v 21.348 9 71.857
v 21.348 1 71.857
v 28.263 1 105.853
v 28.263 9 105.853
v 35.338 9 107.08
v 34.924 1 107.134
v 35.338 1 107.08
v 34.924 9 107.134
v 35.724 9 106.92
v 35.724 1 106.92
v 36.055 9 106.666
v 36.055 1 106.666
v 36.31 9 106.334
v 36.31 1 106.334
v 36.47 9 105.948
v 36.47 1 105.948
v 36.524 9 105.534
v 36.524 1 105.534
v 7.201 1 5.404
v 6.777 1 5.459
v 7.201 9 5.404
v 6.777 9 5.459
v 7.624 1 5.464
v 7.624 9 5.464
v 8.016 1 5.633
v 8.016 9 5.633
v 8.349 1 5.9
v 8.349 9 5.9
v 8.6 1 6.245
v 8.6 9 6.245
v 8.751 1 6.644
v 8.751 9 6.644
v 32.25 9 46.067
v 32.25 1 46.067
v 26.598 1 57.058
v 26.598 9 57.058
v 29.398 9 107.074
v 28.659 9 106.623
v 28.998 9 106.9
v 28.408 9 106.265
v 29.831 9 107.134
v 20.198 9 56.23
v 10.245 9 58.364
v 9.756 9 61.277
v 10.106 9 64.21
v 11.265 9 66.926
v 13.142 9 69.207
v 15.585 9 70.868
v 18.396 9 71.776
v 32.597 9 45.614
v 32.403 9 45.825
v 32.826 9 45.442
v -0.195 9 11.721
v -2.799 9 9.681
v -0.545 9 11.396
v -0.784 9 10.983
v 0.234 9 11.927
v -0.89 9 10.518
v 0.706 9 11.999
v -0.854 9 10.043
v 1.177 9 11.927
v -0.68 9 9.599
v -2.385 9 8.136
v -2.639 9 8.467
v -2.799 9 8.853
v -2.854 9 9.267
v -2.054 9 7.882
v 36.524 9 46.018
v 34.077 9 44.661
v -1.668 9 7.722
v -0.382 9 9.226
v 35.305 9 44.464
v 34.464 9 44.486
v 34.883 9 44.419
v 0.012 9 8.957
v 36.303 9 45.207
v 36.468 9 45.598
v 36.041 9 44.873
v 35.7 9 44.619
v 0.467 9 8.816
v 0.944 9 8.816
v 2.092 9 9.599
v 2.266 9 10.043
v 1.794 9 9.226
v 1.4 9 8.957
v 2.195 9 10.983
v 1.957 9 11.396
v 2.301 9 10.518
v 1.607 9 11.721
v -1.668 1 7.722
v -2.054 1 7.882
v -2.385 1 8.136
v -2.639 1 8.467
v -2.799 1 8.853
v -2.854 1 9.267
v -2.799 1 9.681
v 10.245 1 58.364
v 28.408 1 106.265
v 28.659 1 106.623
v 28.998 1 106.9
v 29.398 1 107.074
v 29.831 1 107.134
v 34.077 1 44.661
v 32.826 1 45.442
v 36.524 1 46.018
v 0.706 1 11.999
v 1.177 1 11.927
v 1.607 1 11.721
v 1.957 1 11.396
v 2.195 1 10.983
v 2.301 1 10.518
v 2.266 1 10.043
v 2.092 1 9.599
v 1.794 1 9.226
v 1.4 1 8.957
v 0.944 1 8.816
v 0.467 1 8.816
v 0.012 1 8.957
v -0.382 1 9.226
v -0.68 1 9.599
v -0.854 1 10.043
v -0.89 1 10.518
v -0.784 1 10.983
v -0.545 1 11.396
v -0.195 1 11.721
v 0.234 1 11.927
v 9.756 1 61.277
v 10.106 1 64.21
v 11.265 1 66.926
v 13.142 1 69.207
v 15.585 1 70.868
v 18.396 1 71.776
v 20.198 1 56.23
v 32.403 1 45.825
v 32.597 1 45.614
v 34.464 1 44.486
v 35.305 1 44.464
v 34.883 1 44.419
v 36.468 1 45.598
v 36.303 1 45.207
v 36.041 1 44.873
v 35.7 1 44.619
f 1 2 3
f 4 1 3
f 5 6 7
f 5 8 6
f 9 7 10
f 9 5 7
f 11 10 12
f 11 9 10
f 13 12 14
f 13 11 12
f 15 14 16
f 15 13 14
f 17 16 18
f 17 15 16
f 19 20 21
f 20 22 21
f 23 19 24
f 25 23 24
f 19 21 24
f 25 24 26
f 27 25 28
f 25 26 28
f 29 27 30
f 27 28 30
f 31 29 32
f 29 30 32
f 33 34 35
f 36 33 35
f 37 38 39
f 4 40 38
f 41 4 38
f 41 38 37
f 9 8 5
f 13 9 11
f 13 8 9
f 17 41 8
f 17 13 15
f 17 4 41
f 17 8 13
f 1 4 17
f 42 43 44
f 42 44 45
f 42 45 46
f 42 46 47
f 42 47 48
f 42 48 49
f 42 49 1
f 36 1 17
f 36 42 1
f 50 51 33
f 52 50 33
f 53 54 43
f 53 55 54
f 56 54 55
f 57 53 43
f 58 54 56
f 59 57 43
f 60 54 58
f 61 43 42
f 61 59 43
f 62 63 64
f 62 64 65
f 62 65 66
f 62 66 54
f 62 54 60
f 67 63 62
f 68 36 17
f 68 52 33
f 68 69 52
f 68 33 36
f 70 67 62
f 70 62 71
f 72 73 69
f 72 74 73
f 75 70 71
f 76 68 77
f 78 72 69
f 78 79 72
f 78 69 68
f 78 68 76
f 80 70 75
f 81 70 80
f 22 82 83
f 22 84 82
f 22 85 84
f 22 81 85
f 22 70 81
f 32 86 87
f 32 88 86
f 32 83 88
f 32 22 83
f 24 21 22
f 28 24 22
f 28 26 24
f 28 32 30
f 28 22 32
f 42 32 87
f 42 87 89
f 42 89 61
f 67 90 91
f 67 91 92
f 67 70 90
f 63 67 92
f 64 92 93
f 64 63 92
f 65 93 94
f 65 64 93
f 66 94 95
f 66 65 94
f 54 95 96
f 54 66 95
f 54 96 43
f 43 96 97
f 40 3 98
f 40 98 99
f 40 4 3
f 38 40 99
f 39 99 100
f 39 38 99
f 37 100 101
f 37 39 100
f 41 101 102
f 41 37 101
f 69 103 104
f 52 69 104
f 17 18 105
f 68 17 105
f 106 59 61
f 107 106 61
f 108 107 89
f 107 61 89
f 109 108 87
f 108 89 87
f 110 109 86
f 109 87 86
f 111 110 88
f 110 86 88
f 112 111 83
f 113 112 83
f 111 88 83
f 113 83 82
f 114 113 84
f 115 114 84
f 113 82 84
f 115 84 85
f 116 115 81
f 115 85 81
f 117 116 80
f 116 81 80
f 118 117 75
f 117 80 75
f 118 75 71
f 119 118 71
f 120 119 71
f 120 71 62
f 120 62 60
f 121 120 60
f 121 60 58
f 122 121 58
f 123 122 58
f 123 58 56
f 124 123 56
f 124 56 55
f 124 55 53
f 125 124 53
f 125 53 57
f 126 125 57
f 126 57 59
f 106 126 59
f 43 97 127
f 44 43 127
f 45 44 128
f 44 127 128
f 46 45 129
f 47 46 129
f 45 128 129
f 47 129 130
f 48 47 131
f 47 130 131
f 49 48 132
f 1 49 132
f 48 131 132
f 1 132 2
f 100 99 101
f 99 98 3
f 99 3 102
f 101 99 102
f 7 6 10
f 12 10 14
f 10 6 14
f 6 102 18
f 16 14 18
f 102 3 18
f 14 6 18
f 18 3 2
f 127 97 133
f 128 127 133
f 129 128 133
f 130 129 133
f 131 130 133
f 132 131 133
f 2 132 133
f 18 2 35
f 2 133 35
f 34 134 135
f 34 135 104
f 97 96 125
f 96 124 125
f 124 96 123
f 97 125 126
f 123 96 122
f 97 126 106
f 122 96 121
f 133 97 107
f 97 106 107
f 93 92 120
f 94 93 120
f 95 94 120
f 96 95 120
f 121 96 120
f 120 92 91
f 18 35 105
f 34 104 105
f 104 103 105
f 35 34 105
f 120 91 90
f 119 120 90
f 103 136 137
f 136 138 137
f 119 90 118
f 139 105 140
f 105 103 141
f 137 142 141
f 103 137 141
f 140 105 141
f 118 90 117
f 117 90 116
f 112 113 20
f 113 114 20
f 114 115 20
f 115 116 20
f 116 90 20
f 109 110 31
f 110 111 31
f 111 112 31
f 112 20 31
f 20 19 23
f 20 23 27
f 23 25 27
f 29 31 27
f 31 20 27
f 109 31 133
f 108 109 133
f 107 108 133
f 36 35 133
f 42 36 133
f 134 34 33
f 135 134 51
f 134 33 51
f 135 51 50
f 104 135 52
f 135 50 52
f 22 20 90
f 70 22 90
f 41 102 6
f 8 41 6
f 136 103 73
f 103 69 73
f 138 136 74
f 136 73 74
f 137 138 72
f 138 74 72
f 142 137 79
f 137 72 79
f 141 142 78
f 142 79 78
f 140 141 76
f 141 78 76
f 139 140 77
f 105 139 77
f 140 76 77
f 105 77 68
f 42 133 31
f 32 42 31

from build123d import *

# Parameters (mm, degrees)
BOSS_EXTRUDE1_DEPTH = 10
SKETCH2_R           = 2
CUT_EXTRUDE1_DEPTH  = 127.711975624
FILLET1_R           = 2
L_EK1_SCALE         = 2
L_EK2_SCALE         = 0.4


with BuildPart() as part:
    # Sketch1 → Boss-Extrude1 (new body)
    with BuildSketch(Plane(origin=(0, 0, 0), x_dir=(1, 0, 0), z_dir=(0, 1, 0))):
        with BuildLine():
            Line((5.38708673, 8.005739827), (-9.101800665, 4.12345415))
            Line((-9.101800665, 4.12345415), (7.721437267, -58.661724559))
            ThreePointArc((7.721437267, -58.661724559), (10.067992025, -70.873983123), (21.600150017, -75.52746682))
            Line((21.600150017, -75.52746682), (30.569895869, -119.624446982))
            Line((30.569895869, -119.624446982), (40.569895869, -119.624446982))
            Line((40.569895869, -119.624446982), (40.569895869, -39.624446982))
            Line((40.569895869, -39.624446982), (35.479571099, -42.800701652))
            Line((35.479571099, -42.800701652), (28.162650962, -57.029639761))
            Line((28.162650962, -57.029639761), (20.162650962, -55.994260173))
            Line((20.162650962, -55.994260173), (5.38708673, 8.005739827))
        make_face()
    extrude(amount=BOSS_EXTRUDE1_DEPTH)

    # Sketch2 → Cut-Extrude1 (cut, through all)
    with BuildSketch(Plane(origin=(0, 10, 0), x_dir=(1, 0, 0), z_dir=(0, 1, 0))):
        with Locations(Location((-4.202821179, 1.295027025, 0), (0, 0, 270))):
            Circle(SKETCH2_R)
    extrude(amount=-CUT_EXTRUDE1_DEPTH, mode=Mode.SUBTRACT)

    # Fillet1
    fillet1_edges = [part.edges().sort_by_distance(p)[0] for p in [
        (35.479571099, 5, 42.800701652),
        (40.569895869, 5, 39.624446982),
        (40.569895869, 5, 119.624446982),
        (30.569895869, 5, 119.624446982),
        (-9.101800665, 5, -4.12345415),
        (5.38708673, 5, -8.005739827),
    ]]
    fillet(fillet1_edges, radius=FILLET1_R)


with BuildPart() as part_1:
    # Ölçek1: scaled about (20.340725974, 5, 57.172914763)
    add(part.part.scale(L_EK1_SCALE).moved(Location((-20.340725974, -5, -57.172914763))))


with BuildPart() as part_2:
    # Ölçek2: scaled about (20.340725974, 5, 57.172914763)
    add(part_1.part.scale(L_EK2_SCALE).moved(Location((12.204435584, 3, 34.303748858))))


solid = part_2.part
